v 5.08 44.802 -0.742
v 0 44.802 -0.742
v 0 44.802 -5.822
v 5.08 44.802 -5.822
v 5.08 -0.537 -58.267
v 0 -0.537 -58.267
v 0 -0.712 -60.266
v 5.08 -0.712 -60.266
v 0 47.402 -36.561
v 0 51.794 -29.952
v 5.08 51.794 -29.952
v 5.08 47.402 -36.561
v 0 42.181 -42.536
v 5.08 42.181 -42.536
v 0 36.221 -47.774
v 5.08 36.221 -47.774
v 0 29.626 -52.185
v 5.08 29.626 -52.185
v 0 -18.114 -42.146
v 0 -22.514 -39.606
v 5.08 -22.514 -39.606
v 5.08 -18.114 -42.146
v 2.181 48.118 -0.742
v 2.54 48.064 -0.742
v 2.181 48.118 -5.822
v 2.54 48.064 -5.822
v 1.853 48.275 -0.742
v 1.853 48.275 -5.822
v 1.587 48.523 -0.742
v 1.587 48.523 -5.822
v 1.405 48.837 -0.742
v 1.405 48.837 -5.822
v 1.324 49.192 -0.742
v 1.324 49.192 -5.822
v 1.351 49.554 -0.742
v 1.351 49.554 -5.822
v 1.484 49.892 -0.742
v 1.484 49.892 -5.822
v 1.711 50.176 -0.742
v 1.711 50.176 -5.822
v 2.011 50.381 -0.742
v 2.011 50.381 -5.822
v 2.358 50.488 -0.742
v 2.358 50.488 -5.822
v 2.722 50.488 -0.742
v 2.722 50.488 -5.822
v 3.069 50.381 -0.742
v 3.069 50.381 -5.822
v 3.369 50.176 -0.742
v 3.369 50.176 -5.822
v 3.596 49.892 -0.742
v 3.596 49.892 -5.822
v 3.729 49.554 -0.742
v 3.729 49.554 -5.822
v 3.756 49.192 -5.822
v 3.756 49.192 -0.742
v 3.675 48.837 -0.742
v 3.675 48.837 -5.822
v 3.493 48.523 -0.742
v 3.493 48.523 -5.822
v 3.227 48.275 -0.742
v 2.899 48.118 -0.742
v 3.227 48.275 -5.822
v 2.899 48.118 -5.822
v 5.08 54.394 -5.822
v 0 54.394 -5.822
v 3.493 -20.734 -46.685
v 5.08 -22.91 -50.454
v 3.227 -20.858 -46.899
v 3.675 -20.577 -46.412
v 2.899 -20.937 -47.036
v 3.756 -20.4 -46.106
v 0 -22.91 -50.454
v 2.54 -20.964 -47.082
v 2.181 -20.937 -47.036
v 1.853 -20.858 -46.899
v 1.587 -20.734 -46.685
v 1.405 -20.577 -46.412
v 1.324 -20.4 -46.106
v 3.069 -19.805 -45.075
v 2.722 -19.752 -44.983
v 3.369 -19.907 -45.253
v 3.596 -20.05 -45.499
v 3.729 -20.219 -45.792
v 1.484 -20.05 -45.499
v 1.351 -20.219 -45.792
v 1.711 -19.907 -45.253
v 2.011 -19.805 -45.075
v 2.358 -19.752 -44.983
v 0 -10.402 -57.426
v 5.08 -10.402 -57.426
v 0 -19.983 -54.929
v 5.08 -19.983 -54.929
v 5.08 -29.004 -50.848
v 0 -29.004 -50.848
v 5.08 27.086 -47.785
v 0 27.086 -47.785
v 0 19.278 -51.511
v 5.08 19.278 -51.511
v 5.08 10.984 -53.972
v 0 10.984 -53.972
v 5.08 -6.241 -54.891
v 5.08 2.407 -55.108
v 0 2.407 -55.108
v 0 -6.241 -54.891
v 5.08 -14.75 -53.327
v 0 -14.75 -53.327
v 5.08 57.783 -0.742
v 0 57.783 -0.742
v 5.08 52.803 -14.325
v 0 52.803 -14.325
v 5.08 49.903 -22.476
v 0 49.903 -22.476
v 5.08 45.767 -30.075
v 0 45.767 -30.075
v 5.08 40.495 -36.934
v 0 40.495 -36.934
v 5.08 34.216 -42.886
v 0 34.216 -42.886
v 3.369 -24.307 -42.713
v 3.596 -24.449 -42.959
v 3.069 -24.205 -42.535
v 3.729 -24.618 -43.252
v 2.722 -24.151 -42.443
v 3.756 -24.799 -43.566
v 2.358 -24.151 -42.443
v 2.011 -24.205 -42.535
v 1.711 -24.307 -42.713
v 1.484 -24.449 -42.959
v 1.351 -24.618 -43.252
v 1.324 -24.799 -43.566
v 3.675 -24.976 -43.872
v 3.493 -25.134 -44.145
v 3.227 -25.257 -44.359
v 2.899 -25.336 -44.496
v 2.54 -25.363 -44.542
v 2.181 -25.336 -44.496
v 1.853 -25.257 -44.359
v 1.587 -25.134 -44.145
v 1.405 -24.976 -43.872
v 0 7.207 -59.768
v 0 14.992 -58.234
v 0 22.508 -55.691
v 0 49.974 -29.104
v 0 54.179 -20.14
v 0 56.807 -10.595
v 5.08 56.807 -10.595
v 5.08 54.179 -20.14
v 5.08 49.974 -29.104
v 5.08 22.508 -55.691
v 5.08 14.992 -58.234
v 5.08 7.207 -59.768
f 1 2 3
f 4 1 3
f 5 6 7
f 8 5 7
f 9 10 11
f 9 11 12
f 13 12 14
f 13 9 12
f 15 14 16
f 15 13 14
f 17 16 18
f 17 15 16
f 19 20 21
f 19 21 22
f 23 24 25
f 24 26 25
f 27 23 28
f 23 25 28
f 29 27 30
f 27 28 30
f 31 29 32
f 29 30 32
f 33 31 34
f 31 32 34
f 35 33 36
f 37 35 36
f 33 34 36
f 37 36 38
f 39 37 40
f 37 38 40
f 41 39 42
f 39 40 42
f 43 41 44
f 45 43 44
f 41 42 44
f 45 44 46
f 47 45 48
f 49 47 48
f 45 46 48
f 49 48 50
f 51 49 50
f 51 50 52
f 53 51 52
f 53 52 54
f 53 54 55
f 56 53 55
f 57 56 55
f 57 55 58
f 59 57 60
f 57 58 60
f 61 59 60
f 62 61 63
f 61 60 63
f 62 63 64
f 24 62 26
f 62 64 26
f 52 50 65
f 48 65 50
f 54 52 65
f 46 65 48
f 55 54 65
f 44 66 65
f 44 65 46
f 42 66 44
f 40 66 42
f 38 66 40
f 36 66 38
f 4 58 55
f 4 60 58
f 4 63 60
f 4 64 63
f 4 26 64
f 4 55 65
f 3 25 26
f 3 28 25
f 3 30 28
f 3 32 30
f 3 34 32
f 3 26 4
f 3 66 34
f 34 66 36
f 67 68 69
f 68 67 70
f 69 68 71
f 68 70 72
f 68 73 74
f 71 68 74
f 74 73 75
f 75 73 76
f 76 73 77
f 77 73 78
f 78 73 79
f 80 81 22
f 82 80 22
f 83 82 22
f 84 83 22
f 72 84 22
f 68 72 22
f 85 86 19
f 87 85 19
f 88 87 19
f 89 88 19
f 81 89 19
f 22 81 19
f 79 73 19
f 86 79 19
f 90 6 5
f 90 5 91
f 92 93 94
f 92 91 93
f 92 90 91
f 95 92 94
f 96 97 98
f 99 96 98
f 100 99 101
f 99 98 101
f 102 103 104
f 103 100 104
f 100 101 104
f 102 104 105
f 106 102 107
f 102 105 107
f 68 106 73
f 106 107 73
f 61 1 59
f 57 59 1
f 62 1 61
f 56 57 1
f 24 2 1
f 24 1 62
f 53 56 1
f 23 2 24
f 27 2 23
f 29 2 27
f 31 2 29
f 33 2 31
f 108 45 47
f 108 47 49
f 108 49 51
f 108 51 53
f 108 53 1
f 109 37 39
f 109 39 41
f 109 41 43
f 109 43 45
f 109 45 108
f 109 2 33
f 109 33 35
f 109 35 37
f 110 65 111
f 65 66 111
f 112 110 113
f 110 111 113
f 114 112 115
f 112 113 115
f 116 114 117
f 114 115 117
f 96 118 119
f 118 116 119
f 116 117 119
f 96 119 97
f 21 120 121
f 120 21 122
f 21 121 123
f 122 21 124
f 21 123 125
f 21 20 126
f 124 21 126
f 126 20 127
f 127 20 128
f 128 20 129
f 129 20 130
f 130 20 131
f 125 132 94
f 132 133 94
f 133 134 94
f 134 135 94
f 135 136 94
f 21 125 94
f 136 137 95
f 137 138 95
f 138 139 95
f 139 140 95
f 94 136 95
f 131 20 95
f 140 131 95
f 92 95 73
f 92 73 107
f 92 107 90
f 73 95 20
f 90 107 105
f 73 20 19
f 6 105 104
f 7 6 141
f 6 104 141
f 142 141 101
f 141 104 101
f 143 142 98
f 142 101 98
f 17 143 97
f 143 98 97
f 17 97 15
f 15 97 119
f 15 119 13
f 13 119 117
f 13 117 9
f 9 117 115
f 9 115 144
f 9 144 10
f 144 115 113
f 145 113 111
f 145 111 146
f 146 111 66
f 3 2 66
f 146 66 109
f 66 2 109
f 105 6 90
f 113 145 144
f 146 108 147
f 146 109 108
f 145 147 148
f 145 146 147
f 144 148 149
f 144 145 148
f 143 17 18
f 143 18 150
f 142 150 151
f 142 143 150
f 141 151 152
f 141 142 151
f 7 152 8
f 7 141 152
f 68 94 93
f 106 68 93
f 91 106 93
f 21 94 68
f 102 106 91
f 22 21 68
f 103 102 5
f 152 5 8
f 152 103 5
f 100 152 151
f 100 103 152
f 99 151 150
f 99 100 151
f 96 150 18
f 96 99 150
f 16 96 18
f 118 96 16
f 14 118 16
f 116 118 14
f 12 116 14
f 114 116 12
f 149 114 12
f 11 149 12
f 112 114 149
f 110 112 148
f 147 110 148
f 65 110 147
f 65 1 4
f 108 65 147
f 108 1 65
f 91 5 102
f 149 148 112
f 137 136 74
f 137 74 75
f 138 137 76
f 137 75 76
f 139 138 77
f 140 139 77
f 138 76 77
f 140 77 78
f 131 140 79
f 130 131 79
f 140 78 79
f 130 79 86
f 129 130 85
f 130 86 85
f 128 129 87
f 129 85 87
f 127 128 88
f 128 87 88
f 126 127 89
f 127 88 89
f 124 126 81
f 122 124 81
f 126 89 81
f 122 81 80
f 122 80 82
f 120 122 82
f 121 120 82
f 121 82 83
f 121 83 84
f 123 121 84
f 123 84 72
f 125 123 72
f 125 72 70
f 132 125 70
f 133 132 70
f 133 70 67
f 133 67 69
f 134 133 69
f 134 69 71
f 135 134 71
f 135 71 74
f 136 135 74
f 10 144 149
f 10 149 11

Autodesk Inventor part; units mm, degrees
ref_plane "YZ Plane" through (0, 0, 0) normal (1, 0, 0) x (0, 1, 0)
ref_plane "XZ Plane" through (0, 0, 0) normal (0, 1, 0) x (-1, 0, 0)
ref_plane "XY Plane" through (0, 0, 0) normal (0, 0, 1) x (1, 0, 0)
sketch "Part" plane through (0, 0, 0) normal (1, 0, 0) x (0, 1, 0)
  line L0 (-0.5368, 0.0583) -> (59.7882, 0.0583) construction
  line L1 (-0.5371, -0.7417) -> (44.8022, -0.7417) construction
  arc A0 (59.7829, -0.7417) -> (59.7882, 0.0583) centre (-0.5368, 0.0583) ccw construction
  line L2 (-0.5368, 0.0583) -> (49.9741, -29.1042) construction
  arc A1 (47.3067, -27.5642) -> (54.7024, -0.7417) centre (-0.5368, 0.0583) ccw construction
  line L3 (69.9104, -5.8217) -> (54.3944, -5.8217) construction
  arc A2 (51.7936, -29.9522) -> (59.7829, -0.7417) centre (-0.5368, 0.0583) ccw construction
  line L4 (-0.5368, 0.0583) -> (66.9803, -116.8847) construction
  arc A3 (29.6257, -52.1846) -> (51.7936, -29.9522) centre (-0.5368, 0.0583) ccw
  arc A4 (27.0857, -47.7852) -> (54.3944, -5.8217) centre (-0.5368, 0.0583) ccw
  arc A5 (54.7024, -0.7417) -> (54.7082, 0.0583) centre (-0.5368, 0.0583) ccw construction
  line L5 (54.7024, -0.7417) -> (59.7829, -0.7417) construction
  line L6 (57.491, -5.8217) -> (54.3944, -5.8217) construction
  line L7 (44.8022, 0.0583) -> (44.8022, -0.7417) construction
  line L8 (44.8022, -0.7417) -> (44.8022, -5.8217)
  line L9 (44.8022, -5.8217) -> (44.8022, -11.0315) construction
  line L10 (44.8022, -0.7417) -> (57.7827, -0.7417)
  line L11 (44.8022, -5.8217) -> (-19.8971, -5.8217) construction
  line L12 (49.2882, 5.599) -> (49.2882, -56.7812) construction
  arc A6 (28.6257, -50.4526) -> (49.9741, -29.1042) centre (-0.5368, 0.0583) ccw construction
  line L13 (54.3944, -5.8217) -> (50.4651, -5.8217) construction
  line L14 (54.3944, -5.8217) -> (44.8022, -5.8217)
  line L15 (49.9741, -29.1042) -> (51.7936, -29.9522)
  arc A7 (49.9741, -29.1042) -> (57.7827, -0.7417) centre (-0.5368, 0.0583) ccw
  arc A8 (57.7827, -0.7417) -> (57.7882, 0.0583) centre (-0.5368, 0.0583) ccw construction
  line L16 (-0.5368, 0.0583) -> (-30.6993, -52.1846) construction
  line L17 (0.1561, -0.3414) -> (-22.5135, -39.6064) construction
  arc A9 (-30.6993, -52.1846) -> (-30.0039, -52.5801) centre (-0.5368, 0.0583) ccw construction
  line L18 (-0.5368, 0.0583) -> (-0.5368, -58.2667) construction
  arc A10 (-27.4636, -48.1802) -> (-0.5368, -55.1867) centre (-0.5368, 0.0583) ccw construction
  line L19 (-30.6682, -63.8907) -> (-22.9102, -50.4535) construction
  arc A11 (-30.0039, -52.5801) -> (-0.7122, -60.2664) centre (-0.5368, 0.0583) ccw construction
  arc A12 (-0.7122, -60.2664) -> (29.6257, -52.1846) centre (-0.5368, 0.0583) ccw
  arc A13 (-22.9102, -50.4535) -> (27.0857, -47.7852) centre (-0.5368, 0.0583) ccw
  arc A14 (-28.1593, -47.7852) -> (-27.4636, -48.1802) centre (-0.5368, 0.0583) ccw construction
  line L20 (-27.4636, -48.1802) -> (-30.0039, -52.5801) construction
  line L21 (-24.4585, -53.1353) -> (-22.9102, -50.4535) construction
  line L22 (-23.2063, -39.2064) -> (-22.5135, -39.6064) construction
  line L23 (-22.5135, -39.6064) -> (-18.1141, -42.1464)
  line L24 (-18.1141, -42.1464) -> (-13.6022, -44.7513) construction
  line L25 (-22.5135, -39.6064) -> (-29.0038, -50.8478)
  line L26 (-18.1141, -42.1464) -> (14.2355, 13.8848) construction
  line L27 (-30.2477, -40.3211) -> (23.7751, -71.5111) construction
  arc A15 (-0.5368, -58.2667) -> (28.6257, -50.4526) centre (-0.5368, 0.0583) ccw construction
  line L28 (-22.9102, -50.4535) -> (-20.9456, -47.0506) construction
  line L29 (-22.9102, -50.4535) -> (-18.1141, -42.1464)
  line L30 (-0.5368, -58.2667) -> (-0.7122, -60.2664)
  arc A16 (-29.0038, -50.8478) -> (-0.5368, -58.2667) centre (-0.5368, 0.0583) ccw
  arc A17 (-29.6993, -50.4526) -> (-29.0038, -50.8478) centre (-0.5368, 0.0583) ccw construction
  dimension "d29" = 60.325
  dimension "d32" = 30
  dimension "d35" = 5.08
  dimension "d37" = 60
  dimension "d38" = 55.245
  dimension "d42" = 14.986
  dimension "d44" = 10.5
  dimension "d45" = 58.325
  dimension "d64" = 0.8
extrude "Extrusion2" add sketch "Part" along normal blind 5.08
sketch "Sketch5" plane through (0, 44.8022, -0.7417) normal (0, 0, 1) x (1, 0, 0)
  line L0 (0, 12.9805) -> (5.08, 12.9805) projected
  line L1 (2.54, 12.9805) -> (2.54, 0) construction
  line L2 (0, 0) -> (5.08, 0) projected
  line L3 (0, 4.4805) -> (5.08, 4.4805) construction
  point P0 (0, -44.8022)
  point P1 (2.54, 4.4805)
  dimension "d48" = 8.5
hole "Hole1" at (2.54, 49.2827, -0.7417) direction (0, 0, -1) diameter 2.4384 depth 12.2936 tip angle 118 clearance for "Flat Head Machine Screw (82)" size "#2" standard "Ansi Unified Screw Threads"
sketch "Sketch6" plane through (0, -29.0038, -50.8478) normal (0, -0.866, 0.5) x (1, 0, 0)
  line L0 (0, 12.9805) -> (5.08, 12.9805) construction
  line L1 (2.54, 12.9805) -> (2.54, 0) construction
  line L2 (0, 0) -> (5.08, 0) construction
  line L3 (0, 5.9891) -> (0, 58.4948) construction
  line L4 (0, 8.5) -> (5.08, 8.5) construction
  line L5 (5.08, 5.9891) -> (5.08, 58.4948) construction
  point P0 (0, 58.5374)
  point P1 (2.54, 8.5)
  dimension "d56" = 8.5
hole "Hole2" at (2.54, -24.7538, -43.4866) direction (0, 0.866, -0.5) diameter 2.4384 depth 12.2936 tip angle 118 clearance for "Flat Head Machine Screw (82)" size "#2" standard "Ansi Unified Screw Threads"
equation "\"d35\" = d29 - d34"
equation "\"d34\" = 55.245"
properties part number "new_insert"
